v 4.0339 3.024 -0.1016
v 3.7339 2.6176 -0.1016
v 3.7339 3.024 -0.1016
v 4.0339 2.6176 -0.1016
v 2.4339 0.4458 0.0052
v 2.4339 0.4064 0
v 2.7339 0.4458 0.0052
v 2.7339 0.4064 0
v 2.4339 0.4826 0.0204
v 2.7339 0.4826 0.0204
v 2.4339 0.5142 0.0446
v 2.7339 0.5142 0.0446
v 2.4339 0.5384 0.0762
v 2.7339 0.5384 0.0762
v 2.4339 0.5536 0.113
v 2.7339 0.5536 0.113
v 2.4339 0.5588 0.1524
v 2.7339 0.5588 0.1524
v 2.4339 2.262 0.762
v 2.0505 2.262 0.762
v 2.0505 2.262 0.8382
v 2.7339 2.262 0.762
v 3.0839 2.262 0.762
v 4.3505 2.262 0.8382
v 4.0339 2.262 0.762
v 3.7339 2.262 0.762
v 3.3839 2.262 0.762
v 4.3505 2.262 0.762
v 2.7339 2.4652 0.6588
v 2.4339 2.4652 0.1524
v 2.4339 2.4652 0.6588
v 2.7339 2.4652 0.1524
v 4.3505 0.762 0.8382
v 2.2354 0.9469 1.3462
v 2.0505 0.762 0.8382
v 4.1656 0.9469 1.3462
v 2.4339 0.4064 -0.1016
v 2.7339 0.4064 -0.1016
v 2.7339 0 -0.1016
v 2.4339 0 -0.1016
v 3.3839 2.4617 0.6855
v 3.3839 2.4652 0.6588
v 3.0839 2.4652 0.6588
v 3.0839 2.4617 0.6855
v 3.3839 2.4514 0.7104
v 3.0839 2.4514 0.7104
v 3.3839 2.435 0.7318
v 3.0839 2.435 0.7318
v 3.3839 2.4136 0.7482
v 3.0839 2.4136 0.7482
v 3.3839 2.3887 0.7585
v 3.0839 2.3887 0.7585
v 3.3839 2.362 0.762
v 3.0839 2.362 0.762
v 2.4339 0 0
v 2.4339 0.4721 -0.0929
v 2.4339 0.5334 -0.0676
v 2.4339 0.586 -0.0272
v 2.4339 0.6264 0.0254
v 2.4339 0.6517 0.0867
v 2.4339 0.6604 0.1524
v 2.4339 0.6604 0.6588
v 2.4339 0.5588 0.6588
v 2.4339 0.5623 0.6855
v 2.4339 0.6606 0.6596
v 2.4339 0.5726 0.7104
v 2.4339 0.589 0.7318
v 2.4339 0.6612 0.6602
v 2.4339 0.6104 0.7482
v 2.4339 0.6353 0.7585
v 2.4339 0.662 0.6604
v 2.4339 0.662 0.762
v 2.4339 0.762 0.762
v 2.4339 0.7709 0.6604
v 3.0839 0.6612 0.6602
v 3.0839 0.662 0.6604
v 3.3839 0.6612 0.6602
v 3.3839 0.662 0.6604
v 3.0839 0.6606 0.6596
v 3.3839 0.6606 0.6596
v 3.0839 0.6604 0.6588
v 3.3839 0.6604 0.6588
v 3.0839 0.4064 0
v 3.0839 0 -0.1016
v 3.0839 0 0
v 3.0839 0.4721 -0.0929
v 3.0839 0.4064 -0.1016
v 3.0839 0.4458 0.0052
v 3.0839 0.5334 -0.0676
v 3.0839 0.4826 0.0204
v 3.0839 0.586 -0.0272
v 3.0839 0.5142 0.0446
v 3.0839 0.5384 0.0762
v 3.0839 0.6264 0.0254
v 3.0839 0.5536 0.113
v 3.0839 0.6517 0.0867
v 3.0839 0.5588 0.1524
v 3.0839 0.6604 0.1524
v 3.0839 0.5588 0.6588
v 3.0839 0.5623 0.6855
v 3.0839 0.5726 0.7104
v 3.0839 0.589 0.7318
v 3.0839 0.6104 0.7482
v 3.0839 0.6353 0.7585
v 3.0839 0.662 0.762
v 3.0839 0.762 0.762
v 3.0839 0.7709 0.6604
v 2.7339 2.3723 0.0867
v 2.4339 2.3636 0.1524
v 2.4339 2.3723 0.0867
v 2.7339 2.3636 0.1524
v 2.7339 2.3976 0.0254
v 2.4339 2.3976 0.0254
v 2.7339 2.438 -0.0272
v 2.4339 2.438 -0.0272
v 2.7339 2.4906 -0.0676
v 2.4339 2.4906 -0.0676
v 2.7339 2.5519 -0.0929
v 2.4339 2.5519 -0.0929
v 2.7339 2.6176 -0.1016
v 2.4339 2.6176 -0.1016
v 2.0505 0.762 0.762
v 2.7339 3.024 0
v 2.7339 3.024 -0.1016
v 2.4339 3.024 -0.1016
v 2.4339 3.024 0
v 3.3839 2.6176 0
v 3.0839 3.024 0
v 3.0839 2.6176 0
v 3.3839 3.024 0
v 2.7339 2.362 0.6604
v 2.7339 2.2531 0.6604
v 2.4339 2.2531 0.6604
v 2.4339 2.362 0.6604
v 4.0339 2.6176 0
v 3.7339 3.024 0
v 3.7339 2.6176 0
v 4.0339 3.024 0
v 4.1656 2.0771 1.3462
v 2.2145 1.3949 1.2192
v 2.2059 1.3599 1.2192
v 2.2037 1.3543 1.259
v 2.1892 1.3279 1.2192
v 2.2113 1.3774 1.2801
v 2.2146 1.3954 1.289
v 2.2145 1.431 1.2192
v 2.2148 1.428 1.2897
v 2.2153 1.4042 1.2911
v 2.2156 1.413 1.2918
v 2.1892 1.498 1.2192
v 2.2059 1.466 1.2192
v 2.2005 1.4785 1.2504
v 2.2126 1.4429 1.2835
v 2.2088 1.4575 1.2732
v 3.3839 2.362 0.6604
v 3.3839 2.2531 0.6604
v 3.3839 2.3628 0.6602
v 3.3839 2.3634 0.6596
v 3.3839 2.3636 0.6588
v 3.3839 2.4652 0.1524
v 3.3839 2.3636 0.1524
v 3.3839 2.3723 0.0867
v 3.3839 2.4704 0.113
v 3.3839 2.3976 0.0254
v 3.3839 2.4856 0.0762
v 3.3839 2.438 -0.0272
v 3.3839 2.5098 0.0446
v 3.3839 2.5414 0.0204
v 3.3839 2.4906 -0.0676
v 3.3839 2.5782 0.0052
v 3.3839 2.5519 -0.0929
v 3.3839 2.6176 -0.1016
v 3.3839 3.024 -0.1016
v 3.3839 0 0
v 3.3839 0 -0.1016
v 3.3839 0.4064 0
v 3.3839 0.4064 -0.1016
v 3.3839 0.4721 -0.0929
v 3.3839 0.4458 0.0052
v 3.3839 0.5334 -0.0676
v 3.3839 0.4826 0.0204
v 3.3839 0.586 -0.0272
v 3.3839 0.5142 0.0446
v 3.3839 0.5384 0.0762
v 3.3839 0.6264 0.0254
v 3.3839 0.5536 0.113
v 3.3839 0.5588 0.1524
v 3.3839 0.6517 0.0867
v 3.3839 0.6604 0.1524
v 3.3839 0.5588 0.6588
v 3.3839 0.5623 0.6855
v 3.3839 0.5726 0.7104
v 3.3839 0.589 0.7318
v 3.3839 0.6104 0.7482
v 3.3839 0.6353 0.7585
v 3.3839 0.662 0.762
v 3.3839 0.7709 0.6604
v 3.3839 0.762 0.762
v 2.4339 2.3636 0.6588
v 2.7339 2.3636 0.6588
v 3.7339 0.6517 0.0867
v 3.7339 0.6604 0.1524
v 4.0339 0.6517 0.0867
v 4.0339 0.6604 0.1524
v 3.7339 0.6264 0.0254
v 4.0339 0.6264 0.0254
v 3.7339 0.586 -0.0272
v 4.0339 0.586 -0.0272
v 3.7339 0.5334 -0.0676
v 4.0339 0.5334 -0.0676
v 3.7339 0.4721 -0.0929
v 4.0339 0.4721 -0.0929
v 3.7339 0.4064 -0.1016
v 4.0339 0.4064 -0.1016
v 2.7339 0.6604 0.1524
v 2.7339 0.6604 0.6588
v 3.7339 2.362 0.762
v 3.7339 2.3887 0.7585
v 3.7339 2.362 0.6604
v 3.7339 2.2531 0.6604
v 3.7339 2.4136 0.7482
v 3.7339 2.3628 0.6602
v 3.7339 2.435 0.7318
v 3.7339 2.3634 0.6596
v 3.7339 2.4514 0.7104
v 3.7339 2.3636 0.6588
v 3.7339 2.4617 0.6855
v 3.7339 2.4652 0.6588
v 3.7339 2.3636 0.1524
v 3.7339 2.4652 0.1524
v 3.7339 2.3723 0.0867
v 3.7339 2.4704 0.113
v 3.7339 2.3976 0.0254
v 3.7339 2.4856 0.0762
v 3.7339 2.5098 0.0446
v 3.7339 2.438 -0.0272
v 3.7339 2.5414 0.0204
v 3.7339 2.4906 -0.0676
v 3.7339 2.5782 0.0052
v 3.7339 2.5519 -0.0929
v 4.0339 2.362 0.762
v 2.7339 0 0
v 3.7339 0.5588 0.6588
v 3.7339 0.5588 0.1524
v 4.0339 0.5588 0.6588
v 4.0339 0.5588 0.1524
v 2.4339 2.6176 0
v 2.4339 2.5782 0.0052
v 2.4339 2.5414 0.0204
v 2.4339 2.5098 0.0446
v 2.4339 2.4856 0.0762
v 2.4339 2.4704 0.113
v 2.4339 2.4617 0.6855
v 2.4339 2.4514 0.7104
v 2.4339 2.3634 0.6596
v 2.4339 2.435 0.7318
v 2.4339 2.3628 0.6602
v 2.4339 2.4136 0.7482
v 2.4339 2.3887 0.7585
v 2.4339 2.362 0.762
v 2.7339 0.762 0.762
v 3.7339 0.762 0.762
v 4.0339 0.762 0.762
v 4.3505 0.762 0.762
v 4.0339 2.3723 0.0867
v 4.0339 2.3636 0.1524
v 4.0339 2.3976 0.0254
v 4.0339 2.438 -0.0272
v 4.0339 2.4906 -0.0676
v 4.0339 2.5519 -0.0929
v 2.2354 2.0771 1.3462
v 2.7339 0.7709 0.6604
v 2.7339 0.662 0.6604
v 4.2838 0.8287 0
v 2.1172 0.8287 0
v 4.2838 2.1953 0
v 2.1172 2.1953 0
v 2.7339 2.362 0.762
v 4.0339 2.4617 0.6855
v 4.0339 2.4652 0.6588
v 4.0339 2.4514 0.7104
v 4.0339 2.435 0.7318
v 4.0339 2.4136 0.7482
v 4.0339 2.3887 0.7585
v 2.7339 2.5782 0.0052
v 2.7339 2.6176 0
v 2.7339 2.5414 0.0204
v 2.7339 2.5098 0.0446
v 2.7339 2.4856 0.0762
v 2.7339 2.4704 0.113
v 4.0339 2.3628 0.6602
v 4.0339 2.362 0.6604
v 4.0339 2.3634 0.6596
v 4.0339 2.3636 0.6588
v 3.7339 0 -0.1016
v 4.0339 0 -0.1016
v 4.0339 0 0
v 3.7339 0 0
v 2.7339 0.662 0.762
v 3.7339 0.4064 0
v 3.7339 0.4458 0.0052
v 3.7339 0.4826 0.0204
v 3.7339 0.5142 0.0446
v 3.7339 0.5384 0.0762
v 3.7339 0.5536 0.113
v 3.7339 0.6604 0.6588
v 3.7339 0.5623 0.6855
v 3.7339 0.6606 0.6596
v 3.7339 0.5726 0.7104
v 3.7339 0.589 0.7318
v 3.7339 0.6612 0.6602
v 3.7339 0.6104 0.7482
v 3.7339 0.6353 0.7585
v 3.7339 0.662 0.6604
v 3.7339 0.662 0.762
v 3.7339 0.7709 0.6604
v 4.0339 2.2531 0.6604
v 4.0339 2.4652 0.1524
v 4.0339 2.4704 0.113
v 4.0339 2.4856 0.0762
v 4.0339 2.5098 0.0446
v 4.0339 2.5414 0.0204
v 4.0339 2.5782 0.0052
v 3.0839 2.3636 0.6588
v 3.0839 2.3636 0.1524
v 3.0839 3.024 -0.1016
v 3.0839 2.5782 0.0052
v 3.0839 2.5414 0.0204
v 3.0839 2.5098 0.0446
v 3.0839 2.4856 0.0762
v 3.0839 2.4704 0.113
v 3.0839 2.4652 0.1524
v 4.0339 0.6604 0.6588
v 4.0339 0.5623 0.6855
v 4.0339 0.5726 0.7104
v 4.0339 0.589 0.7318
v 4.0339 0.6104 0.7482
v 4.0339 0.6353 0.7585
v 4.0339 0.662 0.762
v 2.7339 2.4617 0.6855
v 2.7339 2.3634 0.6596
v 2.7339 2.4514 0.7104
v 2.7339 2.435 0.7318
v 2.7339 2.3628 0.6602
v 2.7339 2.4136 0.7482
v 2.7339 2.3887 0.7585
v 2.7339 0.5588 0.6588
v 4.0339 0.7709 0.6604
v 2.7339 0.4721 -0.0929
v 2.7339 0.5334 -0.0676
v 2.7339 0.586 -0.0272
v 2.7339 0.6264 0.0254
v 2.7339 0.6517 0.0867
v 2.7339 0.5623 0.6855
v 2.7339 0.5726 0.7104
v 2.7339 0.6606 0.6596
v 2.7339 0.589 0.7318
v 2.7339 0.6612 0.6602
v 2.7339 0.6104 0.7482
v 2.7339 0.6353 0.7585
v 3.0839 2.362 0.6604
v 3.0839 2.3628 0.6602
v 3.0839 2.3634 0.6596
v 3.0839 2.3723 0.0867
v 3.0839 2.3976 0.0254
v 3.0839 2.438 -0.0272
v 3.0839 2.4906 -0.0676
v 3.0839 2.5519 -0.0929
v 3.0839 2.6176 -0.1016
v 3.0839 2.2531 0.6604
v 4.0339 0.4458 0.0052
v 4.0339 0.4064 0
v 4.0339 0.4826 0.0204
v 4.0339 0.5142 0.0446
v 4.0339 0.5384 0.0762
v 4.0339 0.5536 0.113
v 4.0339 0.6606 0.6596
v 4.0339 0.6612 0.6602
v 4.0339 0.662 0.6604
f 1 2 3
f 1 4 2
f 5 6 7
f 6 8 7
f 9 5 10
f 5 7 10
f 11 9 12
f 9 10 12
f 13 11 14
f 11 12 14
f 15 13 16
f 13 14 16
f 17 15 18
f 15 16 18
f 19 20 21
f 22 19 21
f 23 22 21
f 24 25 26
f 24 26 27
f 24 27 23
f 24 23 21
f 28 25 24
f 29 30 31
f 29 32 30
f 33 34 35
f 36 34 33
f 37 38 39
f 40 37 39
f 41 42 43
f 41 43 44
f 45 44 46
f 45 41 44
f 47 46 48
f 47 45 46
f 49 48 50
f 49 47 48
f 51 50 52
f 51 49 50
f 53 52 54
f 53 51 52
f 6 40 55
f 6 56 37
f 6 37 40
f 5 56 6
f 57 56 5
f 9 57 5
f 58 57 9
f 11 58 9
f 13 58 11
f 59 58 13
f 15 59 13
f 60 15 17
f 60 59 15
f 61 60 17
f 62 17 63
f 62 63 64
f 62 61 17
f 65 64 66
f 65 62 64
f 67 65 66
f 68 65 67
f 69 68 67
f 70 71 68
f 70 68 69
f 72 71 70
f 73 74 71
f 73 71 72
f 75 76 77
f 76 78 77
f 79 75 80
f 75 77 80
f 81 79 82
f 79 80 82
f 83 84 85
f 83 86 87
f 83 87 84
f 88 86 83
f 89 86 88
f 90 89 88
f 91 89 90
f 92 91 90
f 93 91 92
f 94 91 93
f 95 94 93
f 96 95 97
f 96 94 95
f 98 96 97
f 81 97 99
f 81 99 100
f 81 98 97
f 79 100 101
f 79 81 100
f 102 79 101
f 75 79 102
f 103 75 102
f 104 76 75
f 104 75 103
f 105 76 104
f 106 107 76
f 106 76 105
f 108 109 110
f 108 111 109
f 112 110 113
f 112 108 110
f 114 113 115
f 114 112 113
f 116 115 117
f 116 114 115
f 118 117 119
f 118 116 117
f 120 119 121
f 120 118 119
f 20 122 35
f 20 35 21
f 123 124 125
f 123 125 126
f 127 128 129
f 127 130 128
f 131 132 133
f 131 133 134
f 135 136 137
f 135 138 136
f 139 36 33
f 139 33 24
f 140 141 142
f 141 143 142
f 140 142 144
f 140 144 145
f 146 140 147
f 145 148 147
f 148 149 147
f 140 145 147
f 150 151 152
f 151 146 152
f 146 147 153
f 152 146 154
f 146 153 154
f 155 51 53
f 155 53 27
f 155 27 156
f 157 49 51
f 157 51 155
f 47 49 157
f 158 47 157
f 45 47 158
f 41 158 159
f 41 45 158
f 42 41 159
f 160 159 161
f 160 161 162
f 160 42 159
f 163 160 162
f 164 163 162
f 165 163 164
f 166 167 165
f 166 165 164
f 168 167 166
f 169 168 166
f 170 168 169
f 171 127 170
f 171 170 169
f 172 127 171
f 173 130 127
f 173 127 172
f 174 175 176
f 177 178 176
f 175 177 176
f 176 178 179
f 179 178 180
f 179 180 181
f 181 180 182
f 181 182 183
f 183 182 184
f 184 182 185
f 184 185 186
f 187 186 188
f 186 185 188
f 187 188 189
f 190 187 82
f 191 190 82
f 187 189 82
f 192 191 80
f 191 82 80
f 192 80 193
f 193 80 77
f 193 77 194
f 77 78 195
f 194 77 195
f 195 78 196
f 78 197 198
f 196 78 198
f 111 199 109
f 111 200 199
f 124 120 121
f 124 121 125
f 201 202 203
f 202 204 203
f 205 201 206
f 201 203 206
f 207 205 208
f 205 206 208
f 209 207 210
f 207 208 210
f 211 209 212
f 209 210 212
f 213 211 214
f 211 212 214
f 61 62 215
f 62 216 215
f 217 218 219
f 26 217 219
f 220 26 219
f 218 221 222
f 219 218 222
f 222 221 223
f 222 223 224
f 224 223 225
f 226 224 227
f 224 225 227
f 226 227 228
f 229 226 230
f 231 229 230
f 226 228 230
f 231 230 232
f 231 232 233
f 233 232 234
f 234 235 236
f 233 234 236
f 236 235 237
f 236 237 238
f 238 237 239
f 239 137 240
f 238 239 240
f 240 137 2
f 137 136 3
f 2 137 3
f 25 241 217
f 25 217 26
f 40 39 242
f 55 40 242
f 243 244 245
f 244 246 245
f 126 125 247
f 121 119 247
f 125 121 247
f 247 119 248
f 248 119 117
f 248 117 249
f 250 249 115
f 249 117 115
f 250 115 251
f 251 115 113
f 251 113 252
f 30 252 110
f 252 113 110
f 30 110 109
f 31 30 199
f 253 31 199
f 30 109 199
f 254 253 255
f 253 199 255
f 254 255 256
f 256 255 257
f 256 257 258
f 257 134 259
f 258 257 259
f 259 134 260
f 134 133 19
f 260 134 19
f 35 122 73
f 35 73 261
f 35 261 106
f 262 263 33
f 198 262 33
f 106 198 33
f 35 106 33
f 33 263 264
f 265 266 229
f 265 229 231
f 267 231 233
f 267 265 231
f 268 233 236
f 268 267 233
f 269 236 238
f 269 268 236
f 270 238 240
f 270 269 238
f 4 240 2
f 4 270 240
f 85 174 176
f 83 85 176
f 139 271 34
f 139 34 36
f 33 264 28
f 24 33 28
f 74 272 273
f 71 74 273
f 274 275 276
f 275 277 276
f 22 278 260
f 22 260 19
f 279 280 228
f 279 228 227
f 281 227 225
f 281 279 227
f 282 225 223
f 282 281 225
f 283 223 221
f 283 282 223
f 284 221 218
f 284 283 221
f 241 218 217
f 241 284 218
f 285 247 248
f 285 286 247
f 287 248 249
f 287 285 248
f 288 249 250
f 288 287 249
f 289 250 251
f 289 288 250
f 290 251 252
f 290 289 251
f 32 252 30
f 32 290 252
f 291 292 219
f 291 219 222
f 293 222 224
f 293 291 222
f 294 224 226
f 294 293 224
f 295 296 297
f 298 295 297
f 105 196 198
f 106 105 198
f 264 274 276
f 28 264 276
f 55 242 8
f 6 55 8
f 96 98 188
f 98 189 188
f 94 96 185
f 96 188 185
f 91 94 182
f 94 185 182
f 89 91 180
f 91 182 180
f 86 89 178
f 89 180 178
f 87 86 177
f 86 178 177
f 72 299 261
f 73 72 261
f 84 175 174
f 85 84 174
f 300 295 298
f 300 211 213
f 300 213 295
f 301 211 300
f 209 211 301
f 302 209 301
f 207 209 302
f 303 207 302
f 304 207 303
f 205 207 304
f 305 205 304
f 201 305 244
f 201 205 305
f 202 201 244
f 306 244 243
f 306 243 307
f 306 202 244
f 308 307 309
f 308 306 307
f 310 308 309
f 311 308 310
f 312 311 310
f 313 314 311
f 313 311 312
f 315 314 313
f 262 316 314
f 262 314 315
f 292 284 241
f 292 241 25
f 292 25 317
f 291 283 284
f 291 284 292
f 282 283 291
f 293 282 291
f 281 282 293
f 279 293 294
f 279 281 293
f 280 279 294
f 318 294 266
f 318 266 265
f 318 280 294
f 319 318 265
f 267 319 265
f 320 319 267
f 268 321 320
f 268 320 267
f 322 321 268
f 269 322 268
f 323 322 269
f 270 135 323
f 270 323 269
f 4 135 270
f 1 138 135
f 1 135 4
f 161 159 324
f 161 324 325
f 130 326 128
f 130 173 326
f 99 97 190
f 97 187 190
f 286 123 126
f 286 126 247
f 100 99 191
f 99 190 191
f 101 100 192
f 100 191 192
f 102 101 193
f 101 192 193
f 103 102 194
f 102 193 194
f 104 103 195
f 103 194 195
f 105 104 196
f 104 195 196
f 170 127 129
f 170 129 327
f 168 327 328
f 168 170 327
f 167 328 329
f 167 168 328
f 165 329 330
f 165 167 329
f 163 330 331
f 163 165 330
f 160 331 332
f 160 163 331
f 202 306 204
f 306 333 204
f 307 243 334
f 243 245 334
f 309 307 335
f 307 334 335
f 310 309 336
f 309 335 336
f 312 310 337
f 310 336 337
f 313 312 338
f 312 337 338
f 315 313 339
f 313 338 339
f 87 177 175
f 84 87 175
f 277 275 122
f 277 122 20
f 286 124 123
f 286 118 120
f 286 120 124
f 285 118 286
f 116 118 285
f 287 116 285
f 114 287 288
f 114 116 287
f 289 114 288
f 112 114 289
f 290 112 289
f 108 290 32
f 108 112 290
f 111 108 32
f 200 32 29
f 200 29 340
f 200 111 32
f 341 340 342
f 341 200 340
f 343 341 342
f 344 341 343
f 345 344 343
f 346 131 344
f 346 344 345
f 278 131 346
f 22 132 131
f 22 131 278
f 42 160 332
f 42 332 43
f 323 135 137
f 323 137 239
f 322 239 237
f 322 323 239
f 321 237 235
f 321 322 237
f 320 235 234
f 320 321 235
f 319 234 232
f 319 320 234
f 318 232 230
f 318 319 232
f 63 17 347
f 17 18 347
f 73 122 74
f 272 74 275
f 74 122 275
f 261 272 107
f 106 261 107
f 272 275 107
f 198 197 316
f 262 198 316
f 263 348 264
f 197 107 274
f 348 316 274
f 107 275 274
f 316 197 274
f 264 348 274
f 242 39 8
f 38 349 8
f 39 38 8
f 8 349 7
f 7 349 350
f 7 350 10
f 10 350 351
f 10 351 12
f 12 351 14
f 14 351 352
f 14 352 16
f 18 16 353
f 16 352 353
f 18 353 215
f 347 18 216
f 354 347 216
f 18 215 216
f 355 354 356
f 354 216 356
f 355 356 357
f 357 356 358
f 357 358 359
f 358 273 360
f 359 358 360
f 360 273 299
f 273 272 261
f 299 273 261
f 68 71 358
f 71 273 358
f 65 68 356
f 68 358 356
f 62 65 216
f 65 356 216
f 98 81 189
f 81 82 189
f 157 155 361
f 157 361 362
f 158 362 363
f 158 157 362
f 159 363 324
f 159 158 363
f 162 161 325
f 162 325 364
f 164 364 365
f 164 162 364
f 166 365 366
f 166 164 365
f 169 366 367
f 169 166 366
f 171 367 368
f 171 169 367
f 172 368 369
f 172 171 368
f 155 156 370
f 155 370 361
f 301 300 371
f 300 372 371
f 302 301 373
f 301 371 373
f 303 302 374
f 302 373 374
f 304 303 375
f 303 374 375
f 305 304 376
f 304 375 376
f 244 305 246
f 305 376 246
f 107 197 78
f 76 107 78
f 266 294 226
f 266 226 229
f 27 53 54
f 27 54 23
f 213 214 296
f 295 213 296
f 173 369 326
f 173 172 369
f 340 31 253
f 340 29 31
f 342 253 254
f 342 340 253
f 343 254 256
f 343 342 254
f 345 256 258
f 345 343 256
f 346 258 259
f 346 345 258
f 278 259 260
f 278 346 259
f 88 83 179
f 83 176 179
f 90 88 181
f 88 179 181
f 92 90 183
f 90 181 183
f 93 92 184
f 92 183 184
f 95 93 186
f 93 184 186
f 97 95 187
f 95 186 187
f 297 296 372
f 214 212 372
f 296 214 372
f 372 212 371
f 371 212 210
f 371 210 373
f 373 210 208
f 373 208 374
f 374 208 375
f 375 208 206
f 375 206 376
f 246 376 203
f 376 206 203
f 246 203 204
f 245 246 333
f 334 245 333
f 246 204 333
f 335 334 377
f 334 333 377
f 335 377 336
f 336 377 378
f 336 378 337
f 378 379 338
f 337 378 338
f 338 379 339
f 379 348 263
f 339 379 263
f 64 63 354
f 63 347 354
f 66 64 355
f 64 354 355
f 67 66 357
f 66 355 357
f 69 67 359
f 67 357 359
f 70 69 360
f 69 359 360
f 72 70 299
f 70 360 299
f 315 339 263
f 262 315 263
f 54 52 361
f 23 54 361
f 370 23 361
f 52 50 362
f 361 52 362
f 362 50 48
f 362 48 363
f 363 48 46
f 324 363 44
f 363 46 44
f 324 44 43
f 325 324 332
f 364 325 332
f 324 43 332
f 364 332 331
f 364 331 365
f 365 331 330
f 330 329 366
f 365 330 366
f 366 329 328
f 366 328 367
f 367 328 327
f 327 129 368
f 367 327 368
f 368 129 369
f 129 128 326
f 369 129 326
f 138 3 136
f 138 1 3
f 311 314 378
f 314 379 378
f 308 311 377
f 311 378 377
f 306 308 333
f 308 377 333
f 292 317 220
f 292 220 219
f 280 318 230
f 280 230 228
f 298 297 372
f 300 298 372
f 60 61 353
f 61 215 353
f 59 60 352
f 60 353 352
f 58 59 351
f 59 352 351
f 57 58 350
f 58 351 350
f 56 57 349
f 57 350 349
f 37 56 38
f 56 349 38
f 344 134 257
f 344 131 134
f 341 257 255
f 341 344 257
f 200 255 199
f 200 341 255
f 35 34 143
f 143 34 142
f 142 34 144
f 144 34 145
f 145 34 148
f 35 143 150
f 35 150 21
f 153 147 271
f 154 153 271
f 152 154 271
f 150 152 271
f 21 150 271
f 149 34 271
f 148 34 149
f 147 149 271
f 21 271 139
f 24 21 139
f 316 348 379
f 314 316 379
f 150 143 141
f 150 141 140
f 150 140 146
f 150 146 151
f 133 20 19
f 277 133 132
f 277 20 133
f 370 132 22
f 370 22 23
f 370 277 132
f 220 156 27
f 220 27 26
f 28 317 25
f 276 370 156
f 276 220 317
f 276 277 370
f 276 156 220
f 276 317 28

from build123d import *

# Parameters (mm, degrees)
SKETCH1_W                = 2.3
SKETCH1_H                = 1.5
BASE_EXTRUDE_DEPTH       = 1.3462
CHAMFER1_SIZE            = 0.508
CHAMFER1_SIZE2           = 0.184896879
CHAMFER1_PART_2_SIZE     = 0.508
CHAMFER1_PART_2_SIZE2    = 0.184896879
CHAMFER1_PART_3_SIZE     = 0.508
CHAMFER1_PART_3_SIZE2    = 0.184896879
CHAMFER1_PART_4_SIZE     = 0.508
CHAMFER1_PART_4_SIZE2    = 0.184896879
CHAMFER2_SIZE            = 0.762
CHAMFER2_SIZE2           = 0.066666362
CHAMFER2_PART_2_SIZE     = 0.762
CHAMFER2_PART_2_SIZE2    = 0.066666362
CHAMFER2_PART_3_SIZE     = 0.762
CHAMFER2_PART_3_SIZE2    = 0.066666362
CHAMFER2_PART_4_SIZE     = 0.762
CHAMFER2_PART_4_SIZE2    = 0.066666362
SKETCH3_R                = 0.15
CUT_EXTRUDE1_DEPTH       = 0.127
BOSS_EXTRUDE_THIN3_DEPTH = 0.15
LPATTERN1_COUNT          = 3
LPATTERN1_PITCH          = 0.65
MIRROR1_COPY_1_DEPTH     = 0.15
MIRROR1_COPY_2_DEPTH     = 0.15


with BuildPart() as part:
    # Sketch1 → Base-Extrude (new body)
    with BuildSketch(Plane.XY):
        with Locations((3.200498433, 1.512)):
            Rectangle(SKETCH1_W, SKETCH1_H)
    extrude(amount=BASE_EXTRUDE_DEPTH)

    # Chamfer1
    chamfer1_edges = [part.edges().sort_by_distance(p)[0] for p in [
        (4.350498433, 1.512, 1.3462),
    ]]
    chamfer1_side = [part.faces().sort_by_distance(p)[0] for p in [
        (4.350498433, 1.512, 0.6731),
    ]]
    chamfer(chamfer1_edges, length=CHAMFER1_SIZE, length2=CHAMFER1_SIZE2, reference=chamfer1_side[0])

    # Chamfer1 part 2
    chamfer1_part_2_edges = [part.edges().sort_by_distance(p)[0] for p in [
        (3.200498433, 2.262, 1.3462),
    ]]
    chamfer1_part_2_side = [part.faces().sort_by_distance(p)[0] for p in [
        (3.200498433, 2.262, 0.6731),
    ]]
    chamfer(chamfer1_part_2_edges, length=CHAMFER1_PART_2_SIZE, length2=CHAMFER1_PART_2_SIZE2, reference=chamfer1_part_2_side[0])

    # Chamfer1 part 3
    chamfer1_part_3_edges = [part.edges().sort_by_distance(p)[0] for p in [
        (2.050498433, 1.512, 1.3462),
    ]]
    chamfer1_part_3_side = [part.faces().sort_by_distance(p)[0] for p in [
        (2.050498433, 1.512, 0.6731),
    ]]
    chamfer(chamfer1_part_3_edges, length=CHAMFER1_PART_3_SIZE, length2=CHAMFER1_PART_3_SIZE2, reference=chamfer1_part_3_side[0])

    # Chamfer1 part 4
    chamfer1_part_4_edges = [part.edges().sort_by_distance(p)[0] for p in [
        (3.200498433, 0.762, 1.3462),
    ]]
    chamfer1_part_4_side = [part.faces().sort_by_distance(p)[0] for p in [
        (3.200498433, 0.762, 0.6731),
    ]]
    chamfer(chamfer1_part_4_edges, length=CHAMFER1_PART_4_SIZE, length2=CHAMFER1_PART_4_SIZE2, reference=chamfer1_part_4_side[0])

    # Chamfer2
    chamfer2_edges = [part.edges().sort_by_distance(p)[0] for p in [
        (3.200498433, 2.262, 0),
    ]]
    chamfer2_side = [part.faces().sort_by_distance(p)[0] for p in [
        (3.200498433, 2.262, 0.4191),
    ]]
    chamfer(chamfer2_edges, length=CHAMFER2_SIZE, length2=CHAMFER2_SIZE2, reference=chamfer2_side[0])

    # Chamfer2 part 2
    chamfer2_part_2_edges = [part.edges().sort_by_distance(p)[0] for p in [
        (4.350498433, 1.512, 0),
    ]]
    chamfer2_part_2_side = [part.faces().sort_by_distance(p)[0] for p in [
        (4.350498433, 1.512, 0.4191),
    ]]
    chamfer(chamfer2_part_2_edges, length=CHAMFER2_PART_2_SIZE, length2=CHAMFER2_PART_2_SIZE2, reference=chamfer2_part_2_side[0])

    # Chamfer2 part 3
    chamfer2_part_3_edges = [part.edges().sort_by_distance(p)[0] for p in [
        (3.200498433, 0.762, 0),
    ]]
    chamfer2_part_3_side = [part.faces().sort_by_distance(p)[0] for p in [
        (3.200498433, 0.762, 0.4191),
    ]]
    chamfer(chamfer2_part_3_edges, length=CHAMFER2_PART_3_SIZE, length2=CHAMFER2_PART_3_SIZE2, reference=chamfer2_part_3_side[0])

    # Chamfer2 part 4
    chamfer2_part_4_edges = [part.edges().sort_by_distance(p)[0] for p in [
        (2.050498433, 1.512, 0),
    ]]
    chamfer2_part_4_side = [part.faces().sort_by_distance(p)[0] for p in [
        (2.050498433, 1.512, 0.4191),
    ]]
    chamfer(chamfer2_part_4_edges, length=CHAMFER2_PART_4_SIZE, length2=CHAMFER2_PART_4_SIZE2, reference=chamfer2_part_4_side[0])

    # Sketch3 → Cut-Extrude1 (cut)
    with BuildSketch(Plane(origin=(0.118935742, 0.142956615, 1.3462), x_dir=(1, 0, 0), z_dir=(0, 0, 1))):
        with Locations((1.946665812, 1.27)):
            Circle(SKETCH3_R)
    extrude(amount=-CUT_EXTRUDE1_DEPTH, mode=Mode.SUBTRACT)

    # Sketch4 → Boss-Extrude-Thin3 (add, symmetric)
    with BuildSketch(Plane(origin=(2.583898433, 0, 0), x_dir=(0, 0, -1), z_dir=(1, 0, 0))):
        with BuildLine():
            Line((0, 0), (0, 0.4064))
            ThreePointArc((0, 0.4064), (-0.044636927, 0.514163073), (-0.1524, 0.5588))
            Line((-0.1524, 0.5588), (-0.6588, 0.5588))
            ThreePointArc((-0.6588, 0.5588), (-0.73177342, 0.58902658), (-0.762, 0.662))
            Line((-0.762, 0.662), (-0.762, 1.062))
            Line((-0.762, 1.062), (-0.6604, 1.062))
            Line((-0.6604, 1.062), (-0.6604, 0.662))
            ThreePointArc((-0.6604, 0.662), (-0.659931371, 0.660868629), (-0.6588, 0.6604))
            Line((-0.6588, 0.6604), (-0.1524, 0.6604))
            ThreePointArc((-0.1524, 0.6604), (0.027205122, 0.586005122), (0.1016, 0.4064))
            Line((0.1016, 0.4064), (0.1016, 0))
            Line((0.1016, 0), (0, 0))
        make_face()
    boss_extrude_thin3 = extrude(amount=BOSS_EXTRUDE_THIN3_DEPTH, both=True)

    # LPattern1: Boss-Extrude-Thin3 ×3
    with Locations(*[(i * LPATTERN1_PITCH, 0, 0) for i in range(1, LPATTERN1_COUNT)]):
        add(boss_extrude_thin3)

    # Mirror1: Boss-Extrude-Thin3 across plane
    add(boss_extrude_thin3.mirror(Plane.ZX.offset(1.512)))

    # Mirror1 copy 1 sketch → Mirror1 copy 1 (add, symmetric)
    with BuildSketch(Plane(origin=(3.233898433, 3.024, 0), x_dir=(0, 0, -1), z_dir=(1, 0, 0))):
        with BuildLine():
            Line((0, 0), (0, -0.4064))
            ThreePointArc((0, -0.4064), (-0.044636927, -0.514163073), (-0.1524, -0.5588))
            Line((-0.1524, -0.5588), (-0.6588, -0.5588))
            ThreePointArc((-0.6588, -0.5588), (-0.73177342, -0.58902658), (-0.762, -0.662))
            Line((-0.762, -0.662), (-0.762, -1.062))
            Line((-0.762, -1.062), (-0.6604, -1.062))
            Line((-0.6604, -1.062), (-0.6604, -0.662))
            ThreePointArc((-0.6604, -0.662), (-0.659931371, -0.660868629), (-0.6588, -0.6604))
            Line((-0.6588, -0.6604), (-0.1524, -0.6604))
            ThreePointArc((-0.1524, -0.6604), (0.027205122, -0.586005122), (0.1016, -0.4064))
            Line((0.1016, -0.4064), (0.1016, 0))
            Line((0.1016, 0), (0, 0))
        make_face()
    extrude(amount=MIRROR1_COPY_1_DEPTH, both=True)

    # Mirror1 copy 2 sketch → Mirror1 copy 2 (add, symmetric)
    with BuildSketch(Plane(origin=(3.883898433, 3.024, 0), x_dir=(0, 0, -1), z_dir=(1, 0, 0))):
        with BuildLine():
            Line((0, 0), (0, -0.4064))
            ThreePointArc((0, -0.4064), (-0.044636927, -0.514163073), (-0.1524, -0.5588))
            Line((-0.1524, -0.5588), (-0.6588, -0.5588))
            ThreePointArc((-0.6588, -0.5588), (-0.73177342, -0.58902658), (-0.762, -0.662))
            Line((-0.762, -0.662), (-0.762, -1.062))
            Line((-0.762, -1.062), (-0.6604, -1.062))
            Line((-0.6604, -1.062), (-0.6604, -0.662))
            ThreePointArc((-0.6604, -0.662), (-0.659931371, -0.660868629), (-0.6588, -0.6604))
            Line((-0.6588, -0.6604), (-0.1524, -0.6604))
            ThreePointArc((-0.1524, -0.6604), (0.027205122, -0.586005122), (0.1016, -0.4064))
            Line((0.1016, -0.4064), (0.1016, 0))
            Line((0.1016, 0), (0, 0))
        make_face()
    extrude(amount=MIRROR1_COPY_2_DEPTH, both=True)


solid = part.part
